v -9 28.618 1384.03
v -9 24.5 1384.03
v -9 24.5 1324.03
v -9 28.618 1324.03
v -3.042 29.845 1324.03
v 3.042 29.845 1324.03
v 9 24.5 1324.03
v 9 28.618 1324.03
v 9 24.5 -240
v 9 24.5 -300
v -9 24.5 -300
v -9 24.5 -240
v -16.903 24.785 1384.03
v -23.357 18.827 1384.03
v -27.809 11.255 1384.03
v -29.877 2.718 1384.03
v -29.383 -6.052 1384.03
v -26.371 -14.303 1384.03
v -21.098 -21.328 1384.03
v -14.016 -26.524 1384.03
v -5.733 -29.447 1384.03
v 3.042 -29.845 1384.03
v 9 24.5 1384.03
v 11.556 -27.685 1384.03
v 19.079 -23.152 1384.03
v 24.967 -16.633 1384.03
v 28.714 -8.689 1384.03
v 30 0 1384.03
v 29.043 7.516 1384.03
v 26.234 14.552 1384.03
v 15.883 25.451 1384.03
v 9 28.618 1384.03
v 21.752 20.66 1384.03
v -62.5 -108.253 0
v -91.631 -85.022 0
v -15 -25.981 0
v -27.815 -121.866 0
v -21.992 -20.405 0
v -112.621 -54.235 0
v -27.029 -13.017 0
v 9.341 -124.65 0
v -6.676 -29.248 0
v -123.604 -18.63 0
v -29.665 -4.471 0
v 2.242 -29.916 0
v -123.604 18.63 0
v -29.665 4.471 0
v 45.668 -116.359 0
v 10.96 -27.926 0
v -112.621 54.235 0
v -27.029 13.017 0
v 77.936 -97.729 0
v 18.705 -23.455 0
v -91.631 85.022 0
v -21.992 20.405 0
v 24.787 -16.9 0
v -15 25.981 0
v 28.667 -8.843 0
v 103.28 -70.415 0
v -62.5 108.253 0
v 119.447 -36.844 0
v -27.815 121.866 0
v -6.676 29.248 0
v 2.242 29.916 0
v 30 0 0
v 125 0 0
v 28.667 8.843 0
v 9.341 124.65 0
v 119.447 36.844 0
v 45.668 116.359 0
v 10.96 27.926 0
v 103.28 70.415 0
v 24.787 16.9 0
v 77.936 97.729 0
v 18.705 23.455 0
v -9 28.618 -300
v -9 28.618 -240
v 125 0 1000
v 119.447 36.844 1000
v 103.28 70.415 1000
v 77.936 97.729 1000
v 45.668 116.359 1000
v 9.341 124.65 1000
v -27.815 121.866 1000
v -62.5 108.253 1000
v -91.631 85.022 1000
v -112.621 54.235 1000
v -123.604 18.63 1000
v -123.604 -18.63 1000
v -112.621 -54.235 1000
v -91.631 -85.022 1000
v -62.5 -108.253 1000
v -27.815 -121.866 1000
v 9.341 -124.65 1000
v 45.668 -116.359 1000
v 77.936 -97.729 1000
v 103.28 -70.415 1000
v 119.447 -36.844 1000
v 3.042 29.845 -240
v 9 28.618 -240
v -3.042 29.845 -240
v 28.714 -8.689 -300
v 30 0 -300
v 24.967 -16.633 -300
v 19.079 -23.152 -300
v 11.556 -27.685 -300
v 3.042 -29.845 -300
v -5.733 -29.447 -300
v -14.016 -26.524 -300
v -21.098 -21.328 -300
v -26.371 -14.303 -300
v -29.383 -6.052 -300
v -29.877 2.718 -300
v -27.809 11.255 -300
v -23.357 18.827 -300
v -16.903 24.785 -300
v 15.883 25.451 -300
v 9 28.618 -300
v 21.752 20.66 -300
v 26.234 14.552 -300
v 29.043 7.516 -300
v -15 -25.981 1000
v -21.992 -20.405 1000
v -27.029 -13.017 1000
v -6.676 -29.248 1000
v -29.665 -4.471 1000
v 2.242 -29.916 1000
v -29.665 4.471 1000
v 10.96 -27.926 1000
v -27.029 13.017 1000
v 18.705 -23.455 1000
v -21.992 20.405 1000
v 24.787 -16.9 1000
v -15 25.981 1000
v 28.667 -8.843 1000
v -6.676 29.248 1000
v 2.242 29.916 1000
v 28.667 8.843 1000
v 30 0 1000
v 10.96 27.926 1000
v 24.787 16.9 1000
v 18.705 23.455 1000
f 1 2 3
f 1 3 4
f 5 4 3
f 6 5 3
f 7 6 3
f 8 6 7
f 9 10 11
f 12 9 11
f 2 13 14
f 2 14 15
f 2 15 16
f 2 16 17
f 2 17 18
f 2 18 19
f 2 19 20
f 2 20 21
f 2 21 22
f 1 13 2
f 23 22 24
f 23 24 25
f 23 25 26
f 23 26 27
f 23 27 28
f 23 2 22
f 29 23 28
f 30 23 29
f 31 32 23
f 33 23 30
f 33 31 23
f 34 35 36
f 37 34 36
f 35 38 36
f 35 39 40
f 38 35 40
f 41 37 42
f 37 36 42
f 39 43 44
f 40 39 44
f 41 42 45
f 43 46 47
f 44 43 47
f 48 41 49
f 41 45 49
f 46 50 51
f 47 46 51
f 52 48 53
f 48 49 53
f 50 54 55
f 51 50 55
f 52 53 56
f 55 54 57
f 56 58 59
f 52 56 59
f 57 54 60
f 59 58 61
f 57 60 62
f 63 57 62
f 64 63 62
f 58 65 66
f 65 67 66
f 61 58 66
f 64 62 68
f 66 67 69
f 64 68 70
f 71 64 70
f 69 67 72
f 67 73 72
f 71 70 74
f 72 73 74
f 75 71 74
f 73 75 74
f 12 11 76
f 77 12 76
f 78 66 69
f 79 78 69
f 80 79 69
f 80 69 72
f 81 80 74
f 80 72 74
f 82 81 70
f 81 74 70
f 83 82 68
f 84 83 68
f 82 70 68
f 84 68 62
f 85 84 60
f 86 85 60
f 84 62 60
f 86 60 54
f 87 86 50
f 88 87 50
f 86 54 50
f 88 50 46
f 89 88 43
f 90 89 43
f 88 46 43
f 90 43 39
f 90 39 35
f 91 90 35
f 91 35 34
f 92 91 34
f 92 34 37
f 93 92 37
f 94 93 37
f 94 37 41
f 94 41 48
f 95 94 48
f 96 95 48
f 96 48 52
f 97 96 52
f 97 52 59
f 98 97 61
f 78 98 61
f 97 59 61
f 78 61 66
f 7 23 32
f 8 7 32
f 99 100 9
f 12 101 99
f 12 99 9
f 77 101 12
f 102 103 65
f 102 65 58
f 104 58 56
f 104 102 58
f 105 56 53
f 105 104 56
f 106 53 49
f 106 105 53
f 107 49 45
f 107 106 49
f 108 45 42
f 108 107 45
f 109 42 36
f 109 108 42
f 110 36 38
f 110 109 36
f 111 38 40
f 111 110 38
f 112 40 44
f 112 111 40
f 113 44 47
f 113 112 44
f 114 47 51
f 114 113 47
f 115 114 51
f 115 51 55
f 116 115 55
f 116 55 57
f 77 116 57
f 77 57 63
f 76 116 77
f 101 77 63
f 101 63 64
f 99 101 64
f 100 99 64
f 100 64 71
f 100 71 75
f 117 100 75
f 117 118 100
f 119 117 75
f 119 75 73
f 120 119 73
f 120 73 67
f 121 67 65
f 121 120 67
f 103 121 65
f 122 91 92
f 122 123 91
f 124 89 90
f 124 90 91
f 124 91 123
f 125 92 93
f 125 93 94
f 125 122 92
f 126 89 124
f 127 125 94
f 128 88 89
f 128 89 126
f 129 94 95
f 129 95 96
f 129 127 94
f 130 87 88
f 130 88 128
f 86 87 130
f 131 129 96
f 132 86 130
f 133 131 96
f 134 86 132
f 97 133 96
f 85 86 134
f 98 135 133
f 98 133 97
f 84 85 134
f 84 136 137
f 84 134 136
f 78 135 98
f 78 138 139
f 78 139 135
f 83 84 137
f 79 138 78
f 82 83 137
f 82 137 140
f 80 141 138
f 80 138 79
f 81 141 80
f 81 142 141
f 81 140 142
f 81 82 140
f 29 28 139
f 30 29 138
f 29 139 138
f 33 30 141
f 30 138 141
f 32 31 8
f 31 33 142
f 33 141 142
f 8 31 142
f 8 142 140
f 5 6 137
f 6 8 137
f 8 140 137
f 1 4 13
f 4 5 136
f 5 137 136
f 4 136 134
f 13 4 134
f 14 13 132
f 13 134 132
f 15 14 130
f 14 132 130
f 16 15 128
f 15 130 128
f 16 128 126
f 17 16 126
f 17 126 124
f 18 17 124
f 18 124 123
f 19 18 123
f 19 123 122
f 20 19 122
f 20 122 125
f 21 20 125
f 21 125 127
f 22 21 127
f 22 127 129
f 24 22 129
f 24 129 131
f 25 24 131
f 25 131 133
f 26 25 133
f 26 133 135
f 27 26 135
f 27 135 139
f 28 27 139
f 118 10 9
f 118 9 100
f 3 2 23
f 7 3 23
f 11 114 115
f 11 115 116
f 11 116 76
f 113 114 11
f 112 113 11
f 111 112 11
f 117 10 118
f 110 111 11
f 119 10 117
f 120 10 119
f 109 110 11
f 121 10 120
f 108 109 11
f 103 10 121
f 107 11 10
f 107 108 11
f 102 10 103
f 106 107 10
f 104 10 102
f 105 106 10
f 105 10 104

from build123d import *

# Parameters (mm, degrees)
SKETCH2_R           = 125
BOSS_EXTRUDE1_DEPTH = 1000
SKETCH7_R           = 30
BOSS_EXTRUDE3_DEPTH = 384.03
BOSS_EXTRUDE4_START = 300
SKETCH8_R           = 30
BOSS_EXTRUDE4_DEPTH = 300
SKETCH18_W          = 18
SKETCH18_H          = 11
CUT_EXTRUDE2_DEPTH  = 60
SKETCH19_W          = 18
SKETCH19_H          = 11
CUT_EXTRUDE3_DEPTH  = 60


with BuildPart() as part:
    # Sketch2 → Boss-Extrude1 (new body)
    with BuildSketch(Plane.XY):
        Circle(SKETCH2_R)
    extrude(amount=BOSS_EXTRUDE1_DEPTH)

    # Sketch7 → Boss-Extrude3 (add)
    with BuildSketch(Plane.XY.offset(1000)):
        Circle(SKETCH7_R)
    extrude(amount=BOSS_EXTRUDE3_DEPTH)

    # Sketch8 → Boss-Extrude4 (add)
    with BuildSketch(Plane(origin=(0, 0, 0), x_dir=(-1, 0, 0), z_dir=(0, 0, -1)).offset(BOSS_EXTRUDE4_START)):
        with Locations(Location((0, 0, 0), (0, 0, 180))):
            Circle(SKETCH8_R)
    extrude(amount=-BOSS_EXTRUDE4_DEPTH)

    # Sketch18 → Cut-Extrude2 (cut)
    with BuildSketch(Plane.XY.offset(1384.03)):
        with Locations((0, 30)):
            Rectangle(SKETCH18_W, SKETCH18_H)
    extrude(amount=-CUT_EXTRUDE2_DEPTH, mode=Mode.SUBTRACT)

    # Sketch19 → Cut-Extrude3 (cut)
    with BuildSketch(Plane(origin=(0, 0, -300), x_dir=(-1, 0, 0), z_dir=(0, 0, -1))):
        with Locations((0, 30)):
            Rectangle(SKETCH19_W, SKETCH19_H)
    extrude(amount=-CUT_EXTRUDE3_DEPTH, mode=Mode.SUBTRACT)


solid = part.part
